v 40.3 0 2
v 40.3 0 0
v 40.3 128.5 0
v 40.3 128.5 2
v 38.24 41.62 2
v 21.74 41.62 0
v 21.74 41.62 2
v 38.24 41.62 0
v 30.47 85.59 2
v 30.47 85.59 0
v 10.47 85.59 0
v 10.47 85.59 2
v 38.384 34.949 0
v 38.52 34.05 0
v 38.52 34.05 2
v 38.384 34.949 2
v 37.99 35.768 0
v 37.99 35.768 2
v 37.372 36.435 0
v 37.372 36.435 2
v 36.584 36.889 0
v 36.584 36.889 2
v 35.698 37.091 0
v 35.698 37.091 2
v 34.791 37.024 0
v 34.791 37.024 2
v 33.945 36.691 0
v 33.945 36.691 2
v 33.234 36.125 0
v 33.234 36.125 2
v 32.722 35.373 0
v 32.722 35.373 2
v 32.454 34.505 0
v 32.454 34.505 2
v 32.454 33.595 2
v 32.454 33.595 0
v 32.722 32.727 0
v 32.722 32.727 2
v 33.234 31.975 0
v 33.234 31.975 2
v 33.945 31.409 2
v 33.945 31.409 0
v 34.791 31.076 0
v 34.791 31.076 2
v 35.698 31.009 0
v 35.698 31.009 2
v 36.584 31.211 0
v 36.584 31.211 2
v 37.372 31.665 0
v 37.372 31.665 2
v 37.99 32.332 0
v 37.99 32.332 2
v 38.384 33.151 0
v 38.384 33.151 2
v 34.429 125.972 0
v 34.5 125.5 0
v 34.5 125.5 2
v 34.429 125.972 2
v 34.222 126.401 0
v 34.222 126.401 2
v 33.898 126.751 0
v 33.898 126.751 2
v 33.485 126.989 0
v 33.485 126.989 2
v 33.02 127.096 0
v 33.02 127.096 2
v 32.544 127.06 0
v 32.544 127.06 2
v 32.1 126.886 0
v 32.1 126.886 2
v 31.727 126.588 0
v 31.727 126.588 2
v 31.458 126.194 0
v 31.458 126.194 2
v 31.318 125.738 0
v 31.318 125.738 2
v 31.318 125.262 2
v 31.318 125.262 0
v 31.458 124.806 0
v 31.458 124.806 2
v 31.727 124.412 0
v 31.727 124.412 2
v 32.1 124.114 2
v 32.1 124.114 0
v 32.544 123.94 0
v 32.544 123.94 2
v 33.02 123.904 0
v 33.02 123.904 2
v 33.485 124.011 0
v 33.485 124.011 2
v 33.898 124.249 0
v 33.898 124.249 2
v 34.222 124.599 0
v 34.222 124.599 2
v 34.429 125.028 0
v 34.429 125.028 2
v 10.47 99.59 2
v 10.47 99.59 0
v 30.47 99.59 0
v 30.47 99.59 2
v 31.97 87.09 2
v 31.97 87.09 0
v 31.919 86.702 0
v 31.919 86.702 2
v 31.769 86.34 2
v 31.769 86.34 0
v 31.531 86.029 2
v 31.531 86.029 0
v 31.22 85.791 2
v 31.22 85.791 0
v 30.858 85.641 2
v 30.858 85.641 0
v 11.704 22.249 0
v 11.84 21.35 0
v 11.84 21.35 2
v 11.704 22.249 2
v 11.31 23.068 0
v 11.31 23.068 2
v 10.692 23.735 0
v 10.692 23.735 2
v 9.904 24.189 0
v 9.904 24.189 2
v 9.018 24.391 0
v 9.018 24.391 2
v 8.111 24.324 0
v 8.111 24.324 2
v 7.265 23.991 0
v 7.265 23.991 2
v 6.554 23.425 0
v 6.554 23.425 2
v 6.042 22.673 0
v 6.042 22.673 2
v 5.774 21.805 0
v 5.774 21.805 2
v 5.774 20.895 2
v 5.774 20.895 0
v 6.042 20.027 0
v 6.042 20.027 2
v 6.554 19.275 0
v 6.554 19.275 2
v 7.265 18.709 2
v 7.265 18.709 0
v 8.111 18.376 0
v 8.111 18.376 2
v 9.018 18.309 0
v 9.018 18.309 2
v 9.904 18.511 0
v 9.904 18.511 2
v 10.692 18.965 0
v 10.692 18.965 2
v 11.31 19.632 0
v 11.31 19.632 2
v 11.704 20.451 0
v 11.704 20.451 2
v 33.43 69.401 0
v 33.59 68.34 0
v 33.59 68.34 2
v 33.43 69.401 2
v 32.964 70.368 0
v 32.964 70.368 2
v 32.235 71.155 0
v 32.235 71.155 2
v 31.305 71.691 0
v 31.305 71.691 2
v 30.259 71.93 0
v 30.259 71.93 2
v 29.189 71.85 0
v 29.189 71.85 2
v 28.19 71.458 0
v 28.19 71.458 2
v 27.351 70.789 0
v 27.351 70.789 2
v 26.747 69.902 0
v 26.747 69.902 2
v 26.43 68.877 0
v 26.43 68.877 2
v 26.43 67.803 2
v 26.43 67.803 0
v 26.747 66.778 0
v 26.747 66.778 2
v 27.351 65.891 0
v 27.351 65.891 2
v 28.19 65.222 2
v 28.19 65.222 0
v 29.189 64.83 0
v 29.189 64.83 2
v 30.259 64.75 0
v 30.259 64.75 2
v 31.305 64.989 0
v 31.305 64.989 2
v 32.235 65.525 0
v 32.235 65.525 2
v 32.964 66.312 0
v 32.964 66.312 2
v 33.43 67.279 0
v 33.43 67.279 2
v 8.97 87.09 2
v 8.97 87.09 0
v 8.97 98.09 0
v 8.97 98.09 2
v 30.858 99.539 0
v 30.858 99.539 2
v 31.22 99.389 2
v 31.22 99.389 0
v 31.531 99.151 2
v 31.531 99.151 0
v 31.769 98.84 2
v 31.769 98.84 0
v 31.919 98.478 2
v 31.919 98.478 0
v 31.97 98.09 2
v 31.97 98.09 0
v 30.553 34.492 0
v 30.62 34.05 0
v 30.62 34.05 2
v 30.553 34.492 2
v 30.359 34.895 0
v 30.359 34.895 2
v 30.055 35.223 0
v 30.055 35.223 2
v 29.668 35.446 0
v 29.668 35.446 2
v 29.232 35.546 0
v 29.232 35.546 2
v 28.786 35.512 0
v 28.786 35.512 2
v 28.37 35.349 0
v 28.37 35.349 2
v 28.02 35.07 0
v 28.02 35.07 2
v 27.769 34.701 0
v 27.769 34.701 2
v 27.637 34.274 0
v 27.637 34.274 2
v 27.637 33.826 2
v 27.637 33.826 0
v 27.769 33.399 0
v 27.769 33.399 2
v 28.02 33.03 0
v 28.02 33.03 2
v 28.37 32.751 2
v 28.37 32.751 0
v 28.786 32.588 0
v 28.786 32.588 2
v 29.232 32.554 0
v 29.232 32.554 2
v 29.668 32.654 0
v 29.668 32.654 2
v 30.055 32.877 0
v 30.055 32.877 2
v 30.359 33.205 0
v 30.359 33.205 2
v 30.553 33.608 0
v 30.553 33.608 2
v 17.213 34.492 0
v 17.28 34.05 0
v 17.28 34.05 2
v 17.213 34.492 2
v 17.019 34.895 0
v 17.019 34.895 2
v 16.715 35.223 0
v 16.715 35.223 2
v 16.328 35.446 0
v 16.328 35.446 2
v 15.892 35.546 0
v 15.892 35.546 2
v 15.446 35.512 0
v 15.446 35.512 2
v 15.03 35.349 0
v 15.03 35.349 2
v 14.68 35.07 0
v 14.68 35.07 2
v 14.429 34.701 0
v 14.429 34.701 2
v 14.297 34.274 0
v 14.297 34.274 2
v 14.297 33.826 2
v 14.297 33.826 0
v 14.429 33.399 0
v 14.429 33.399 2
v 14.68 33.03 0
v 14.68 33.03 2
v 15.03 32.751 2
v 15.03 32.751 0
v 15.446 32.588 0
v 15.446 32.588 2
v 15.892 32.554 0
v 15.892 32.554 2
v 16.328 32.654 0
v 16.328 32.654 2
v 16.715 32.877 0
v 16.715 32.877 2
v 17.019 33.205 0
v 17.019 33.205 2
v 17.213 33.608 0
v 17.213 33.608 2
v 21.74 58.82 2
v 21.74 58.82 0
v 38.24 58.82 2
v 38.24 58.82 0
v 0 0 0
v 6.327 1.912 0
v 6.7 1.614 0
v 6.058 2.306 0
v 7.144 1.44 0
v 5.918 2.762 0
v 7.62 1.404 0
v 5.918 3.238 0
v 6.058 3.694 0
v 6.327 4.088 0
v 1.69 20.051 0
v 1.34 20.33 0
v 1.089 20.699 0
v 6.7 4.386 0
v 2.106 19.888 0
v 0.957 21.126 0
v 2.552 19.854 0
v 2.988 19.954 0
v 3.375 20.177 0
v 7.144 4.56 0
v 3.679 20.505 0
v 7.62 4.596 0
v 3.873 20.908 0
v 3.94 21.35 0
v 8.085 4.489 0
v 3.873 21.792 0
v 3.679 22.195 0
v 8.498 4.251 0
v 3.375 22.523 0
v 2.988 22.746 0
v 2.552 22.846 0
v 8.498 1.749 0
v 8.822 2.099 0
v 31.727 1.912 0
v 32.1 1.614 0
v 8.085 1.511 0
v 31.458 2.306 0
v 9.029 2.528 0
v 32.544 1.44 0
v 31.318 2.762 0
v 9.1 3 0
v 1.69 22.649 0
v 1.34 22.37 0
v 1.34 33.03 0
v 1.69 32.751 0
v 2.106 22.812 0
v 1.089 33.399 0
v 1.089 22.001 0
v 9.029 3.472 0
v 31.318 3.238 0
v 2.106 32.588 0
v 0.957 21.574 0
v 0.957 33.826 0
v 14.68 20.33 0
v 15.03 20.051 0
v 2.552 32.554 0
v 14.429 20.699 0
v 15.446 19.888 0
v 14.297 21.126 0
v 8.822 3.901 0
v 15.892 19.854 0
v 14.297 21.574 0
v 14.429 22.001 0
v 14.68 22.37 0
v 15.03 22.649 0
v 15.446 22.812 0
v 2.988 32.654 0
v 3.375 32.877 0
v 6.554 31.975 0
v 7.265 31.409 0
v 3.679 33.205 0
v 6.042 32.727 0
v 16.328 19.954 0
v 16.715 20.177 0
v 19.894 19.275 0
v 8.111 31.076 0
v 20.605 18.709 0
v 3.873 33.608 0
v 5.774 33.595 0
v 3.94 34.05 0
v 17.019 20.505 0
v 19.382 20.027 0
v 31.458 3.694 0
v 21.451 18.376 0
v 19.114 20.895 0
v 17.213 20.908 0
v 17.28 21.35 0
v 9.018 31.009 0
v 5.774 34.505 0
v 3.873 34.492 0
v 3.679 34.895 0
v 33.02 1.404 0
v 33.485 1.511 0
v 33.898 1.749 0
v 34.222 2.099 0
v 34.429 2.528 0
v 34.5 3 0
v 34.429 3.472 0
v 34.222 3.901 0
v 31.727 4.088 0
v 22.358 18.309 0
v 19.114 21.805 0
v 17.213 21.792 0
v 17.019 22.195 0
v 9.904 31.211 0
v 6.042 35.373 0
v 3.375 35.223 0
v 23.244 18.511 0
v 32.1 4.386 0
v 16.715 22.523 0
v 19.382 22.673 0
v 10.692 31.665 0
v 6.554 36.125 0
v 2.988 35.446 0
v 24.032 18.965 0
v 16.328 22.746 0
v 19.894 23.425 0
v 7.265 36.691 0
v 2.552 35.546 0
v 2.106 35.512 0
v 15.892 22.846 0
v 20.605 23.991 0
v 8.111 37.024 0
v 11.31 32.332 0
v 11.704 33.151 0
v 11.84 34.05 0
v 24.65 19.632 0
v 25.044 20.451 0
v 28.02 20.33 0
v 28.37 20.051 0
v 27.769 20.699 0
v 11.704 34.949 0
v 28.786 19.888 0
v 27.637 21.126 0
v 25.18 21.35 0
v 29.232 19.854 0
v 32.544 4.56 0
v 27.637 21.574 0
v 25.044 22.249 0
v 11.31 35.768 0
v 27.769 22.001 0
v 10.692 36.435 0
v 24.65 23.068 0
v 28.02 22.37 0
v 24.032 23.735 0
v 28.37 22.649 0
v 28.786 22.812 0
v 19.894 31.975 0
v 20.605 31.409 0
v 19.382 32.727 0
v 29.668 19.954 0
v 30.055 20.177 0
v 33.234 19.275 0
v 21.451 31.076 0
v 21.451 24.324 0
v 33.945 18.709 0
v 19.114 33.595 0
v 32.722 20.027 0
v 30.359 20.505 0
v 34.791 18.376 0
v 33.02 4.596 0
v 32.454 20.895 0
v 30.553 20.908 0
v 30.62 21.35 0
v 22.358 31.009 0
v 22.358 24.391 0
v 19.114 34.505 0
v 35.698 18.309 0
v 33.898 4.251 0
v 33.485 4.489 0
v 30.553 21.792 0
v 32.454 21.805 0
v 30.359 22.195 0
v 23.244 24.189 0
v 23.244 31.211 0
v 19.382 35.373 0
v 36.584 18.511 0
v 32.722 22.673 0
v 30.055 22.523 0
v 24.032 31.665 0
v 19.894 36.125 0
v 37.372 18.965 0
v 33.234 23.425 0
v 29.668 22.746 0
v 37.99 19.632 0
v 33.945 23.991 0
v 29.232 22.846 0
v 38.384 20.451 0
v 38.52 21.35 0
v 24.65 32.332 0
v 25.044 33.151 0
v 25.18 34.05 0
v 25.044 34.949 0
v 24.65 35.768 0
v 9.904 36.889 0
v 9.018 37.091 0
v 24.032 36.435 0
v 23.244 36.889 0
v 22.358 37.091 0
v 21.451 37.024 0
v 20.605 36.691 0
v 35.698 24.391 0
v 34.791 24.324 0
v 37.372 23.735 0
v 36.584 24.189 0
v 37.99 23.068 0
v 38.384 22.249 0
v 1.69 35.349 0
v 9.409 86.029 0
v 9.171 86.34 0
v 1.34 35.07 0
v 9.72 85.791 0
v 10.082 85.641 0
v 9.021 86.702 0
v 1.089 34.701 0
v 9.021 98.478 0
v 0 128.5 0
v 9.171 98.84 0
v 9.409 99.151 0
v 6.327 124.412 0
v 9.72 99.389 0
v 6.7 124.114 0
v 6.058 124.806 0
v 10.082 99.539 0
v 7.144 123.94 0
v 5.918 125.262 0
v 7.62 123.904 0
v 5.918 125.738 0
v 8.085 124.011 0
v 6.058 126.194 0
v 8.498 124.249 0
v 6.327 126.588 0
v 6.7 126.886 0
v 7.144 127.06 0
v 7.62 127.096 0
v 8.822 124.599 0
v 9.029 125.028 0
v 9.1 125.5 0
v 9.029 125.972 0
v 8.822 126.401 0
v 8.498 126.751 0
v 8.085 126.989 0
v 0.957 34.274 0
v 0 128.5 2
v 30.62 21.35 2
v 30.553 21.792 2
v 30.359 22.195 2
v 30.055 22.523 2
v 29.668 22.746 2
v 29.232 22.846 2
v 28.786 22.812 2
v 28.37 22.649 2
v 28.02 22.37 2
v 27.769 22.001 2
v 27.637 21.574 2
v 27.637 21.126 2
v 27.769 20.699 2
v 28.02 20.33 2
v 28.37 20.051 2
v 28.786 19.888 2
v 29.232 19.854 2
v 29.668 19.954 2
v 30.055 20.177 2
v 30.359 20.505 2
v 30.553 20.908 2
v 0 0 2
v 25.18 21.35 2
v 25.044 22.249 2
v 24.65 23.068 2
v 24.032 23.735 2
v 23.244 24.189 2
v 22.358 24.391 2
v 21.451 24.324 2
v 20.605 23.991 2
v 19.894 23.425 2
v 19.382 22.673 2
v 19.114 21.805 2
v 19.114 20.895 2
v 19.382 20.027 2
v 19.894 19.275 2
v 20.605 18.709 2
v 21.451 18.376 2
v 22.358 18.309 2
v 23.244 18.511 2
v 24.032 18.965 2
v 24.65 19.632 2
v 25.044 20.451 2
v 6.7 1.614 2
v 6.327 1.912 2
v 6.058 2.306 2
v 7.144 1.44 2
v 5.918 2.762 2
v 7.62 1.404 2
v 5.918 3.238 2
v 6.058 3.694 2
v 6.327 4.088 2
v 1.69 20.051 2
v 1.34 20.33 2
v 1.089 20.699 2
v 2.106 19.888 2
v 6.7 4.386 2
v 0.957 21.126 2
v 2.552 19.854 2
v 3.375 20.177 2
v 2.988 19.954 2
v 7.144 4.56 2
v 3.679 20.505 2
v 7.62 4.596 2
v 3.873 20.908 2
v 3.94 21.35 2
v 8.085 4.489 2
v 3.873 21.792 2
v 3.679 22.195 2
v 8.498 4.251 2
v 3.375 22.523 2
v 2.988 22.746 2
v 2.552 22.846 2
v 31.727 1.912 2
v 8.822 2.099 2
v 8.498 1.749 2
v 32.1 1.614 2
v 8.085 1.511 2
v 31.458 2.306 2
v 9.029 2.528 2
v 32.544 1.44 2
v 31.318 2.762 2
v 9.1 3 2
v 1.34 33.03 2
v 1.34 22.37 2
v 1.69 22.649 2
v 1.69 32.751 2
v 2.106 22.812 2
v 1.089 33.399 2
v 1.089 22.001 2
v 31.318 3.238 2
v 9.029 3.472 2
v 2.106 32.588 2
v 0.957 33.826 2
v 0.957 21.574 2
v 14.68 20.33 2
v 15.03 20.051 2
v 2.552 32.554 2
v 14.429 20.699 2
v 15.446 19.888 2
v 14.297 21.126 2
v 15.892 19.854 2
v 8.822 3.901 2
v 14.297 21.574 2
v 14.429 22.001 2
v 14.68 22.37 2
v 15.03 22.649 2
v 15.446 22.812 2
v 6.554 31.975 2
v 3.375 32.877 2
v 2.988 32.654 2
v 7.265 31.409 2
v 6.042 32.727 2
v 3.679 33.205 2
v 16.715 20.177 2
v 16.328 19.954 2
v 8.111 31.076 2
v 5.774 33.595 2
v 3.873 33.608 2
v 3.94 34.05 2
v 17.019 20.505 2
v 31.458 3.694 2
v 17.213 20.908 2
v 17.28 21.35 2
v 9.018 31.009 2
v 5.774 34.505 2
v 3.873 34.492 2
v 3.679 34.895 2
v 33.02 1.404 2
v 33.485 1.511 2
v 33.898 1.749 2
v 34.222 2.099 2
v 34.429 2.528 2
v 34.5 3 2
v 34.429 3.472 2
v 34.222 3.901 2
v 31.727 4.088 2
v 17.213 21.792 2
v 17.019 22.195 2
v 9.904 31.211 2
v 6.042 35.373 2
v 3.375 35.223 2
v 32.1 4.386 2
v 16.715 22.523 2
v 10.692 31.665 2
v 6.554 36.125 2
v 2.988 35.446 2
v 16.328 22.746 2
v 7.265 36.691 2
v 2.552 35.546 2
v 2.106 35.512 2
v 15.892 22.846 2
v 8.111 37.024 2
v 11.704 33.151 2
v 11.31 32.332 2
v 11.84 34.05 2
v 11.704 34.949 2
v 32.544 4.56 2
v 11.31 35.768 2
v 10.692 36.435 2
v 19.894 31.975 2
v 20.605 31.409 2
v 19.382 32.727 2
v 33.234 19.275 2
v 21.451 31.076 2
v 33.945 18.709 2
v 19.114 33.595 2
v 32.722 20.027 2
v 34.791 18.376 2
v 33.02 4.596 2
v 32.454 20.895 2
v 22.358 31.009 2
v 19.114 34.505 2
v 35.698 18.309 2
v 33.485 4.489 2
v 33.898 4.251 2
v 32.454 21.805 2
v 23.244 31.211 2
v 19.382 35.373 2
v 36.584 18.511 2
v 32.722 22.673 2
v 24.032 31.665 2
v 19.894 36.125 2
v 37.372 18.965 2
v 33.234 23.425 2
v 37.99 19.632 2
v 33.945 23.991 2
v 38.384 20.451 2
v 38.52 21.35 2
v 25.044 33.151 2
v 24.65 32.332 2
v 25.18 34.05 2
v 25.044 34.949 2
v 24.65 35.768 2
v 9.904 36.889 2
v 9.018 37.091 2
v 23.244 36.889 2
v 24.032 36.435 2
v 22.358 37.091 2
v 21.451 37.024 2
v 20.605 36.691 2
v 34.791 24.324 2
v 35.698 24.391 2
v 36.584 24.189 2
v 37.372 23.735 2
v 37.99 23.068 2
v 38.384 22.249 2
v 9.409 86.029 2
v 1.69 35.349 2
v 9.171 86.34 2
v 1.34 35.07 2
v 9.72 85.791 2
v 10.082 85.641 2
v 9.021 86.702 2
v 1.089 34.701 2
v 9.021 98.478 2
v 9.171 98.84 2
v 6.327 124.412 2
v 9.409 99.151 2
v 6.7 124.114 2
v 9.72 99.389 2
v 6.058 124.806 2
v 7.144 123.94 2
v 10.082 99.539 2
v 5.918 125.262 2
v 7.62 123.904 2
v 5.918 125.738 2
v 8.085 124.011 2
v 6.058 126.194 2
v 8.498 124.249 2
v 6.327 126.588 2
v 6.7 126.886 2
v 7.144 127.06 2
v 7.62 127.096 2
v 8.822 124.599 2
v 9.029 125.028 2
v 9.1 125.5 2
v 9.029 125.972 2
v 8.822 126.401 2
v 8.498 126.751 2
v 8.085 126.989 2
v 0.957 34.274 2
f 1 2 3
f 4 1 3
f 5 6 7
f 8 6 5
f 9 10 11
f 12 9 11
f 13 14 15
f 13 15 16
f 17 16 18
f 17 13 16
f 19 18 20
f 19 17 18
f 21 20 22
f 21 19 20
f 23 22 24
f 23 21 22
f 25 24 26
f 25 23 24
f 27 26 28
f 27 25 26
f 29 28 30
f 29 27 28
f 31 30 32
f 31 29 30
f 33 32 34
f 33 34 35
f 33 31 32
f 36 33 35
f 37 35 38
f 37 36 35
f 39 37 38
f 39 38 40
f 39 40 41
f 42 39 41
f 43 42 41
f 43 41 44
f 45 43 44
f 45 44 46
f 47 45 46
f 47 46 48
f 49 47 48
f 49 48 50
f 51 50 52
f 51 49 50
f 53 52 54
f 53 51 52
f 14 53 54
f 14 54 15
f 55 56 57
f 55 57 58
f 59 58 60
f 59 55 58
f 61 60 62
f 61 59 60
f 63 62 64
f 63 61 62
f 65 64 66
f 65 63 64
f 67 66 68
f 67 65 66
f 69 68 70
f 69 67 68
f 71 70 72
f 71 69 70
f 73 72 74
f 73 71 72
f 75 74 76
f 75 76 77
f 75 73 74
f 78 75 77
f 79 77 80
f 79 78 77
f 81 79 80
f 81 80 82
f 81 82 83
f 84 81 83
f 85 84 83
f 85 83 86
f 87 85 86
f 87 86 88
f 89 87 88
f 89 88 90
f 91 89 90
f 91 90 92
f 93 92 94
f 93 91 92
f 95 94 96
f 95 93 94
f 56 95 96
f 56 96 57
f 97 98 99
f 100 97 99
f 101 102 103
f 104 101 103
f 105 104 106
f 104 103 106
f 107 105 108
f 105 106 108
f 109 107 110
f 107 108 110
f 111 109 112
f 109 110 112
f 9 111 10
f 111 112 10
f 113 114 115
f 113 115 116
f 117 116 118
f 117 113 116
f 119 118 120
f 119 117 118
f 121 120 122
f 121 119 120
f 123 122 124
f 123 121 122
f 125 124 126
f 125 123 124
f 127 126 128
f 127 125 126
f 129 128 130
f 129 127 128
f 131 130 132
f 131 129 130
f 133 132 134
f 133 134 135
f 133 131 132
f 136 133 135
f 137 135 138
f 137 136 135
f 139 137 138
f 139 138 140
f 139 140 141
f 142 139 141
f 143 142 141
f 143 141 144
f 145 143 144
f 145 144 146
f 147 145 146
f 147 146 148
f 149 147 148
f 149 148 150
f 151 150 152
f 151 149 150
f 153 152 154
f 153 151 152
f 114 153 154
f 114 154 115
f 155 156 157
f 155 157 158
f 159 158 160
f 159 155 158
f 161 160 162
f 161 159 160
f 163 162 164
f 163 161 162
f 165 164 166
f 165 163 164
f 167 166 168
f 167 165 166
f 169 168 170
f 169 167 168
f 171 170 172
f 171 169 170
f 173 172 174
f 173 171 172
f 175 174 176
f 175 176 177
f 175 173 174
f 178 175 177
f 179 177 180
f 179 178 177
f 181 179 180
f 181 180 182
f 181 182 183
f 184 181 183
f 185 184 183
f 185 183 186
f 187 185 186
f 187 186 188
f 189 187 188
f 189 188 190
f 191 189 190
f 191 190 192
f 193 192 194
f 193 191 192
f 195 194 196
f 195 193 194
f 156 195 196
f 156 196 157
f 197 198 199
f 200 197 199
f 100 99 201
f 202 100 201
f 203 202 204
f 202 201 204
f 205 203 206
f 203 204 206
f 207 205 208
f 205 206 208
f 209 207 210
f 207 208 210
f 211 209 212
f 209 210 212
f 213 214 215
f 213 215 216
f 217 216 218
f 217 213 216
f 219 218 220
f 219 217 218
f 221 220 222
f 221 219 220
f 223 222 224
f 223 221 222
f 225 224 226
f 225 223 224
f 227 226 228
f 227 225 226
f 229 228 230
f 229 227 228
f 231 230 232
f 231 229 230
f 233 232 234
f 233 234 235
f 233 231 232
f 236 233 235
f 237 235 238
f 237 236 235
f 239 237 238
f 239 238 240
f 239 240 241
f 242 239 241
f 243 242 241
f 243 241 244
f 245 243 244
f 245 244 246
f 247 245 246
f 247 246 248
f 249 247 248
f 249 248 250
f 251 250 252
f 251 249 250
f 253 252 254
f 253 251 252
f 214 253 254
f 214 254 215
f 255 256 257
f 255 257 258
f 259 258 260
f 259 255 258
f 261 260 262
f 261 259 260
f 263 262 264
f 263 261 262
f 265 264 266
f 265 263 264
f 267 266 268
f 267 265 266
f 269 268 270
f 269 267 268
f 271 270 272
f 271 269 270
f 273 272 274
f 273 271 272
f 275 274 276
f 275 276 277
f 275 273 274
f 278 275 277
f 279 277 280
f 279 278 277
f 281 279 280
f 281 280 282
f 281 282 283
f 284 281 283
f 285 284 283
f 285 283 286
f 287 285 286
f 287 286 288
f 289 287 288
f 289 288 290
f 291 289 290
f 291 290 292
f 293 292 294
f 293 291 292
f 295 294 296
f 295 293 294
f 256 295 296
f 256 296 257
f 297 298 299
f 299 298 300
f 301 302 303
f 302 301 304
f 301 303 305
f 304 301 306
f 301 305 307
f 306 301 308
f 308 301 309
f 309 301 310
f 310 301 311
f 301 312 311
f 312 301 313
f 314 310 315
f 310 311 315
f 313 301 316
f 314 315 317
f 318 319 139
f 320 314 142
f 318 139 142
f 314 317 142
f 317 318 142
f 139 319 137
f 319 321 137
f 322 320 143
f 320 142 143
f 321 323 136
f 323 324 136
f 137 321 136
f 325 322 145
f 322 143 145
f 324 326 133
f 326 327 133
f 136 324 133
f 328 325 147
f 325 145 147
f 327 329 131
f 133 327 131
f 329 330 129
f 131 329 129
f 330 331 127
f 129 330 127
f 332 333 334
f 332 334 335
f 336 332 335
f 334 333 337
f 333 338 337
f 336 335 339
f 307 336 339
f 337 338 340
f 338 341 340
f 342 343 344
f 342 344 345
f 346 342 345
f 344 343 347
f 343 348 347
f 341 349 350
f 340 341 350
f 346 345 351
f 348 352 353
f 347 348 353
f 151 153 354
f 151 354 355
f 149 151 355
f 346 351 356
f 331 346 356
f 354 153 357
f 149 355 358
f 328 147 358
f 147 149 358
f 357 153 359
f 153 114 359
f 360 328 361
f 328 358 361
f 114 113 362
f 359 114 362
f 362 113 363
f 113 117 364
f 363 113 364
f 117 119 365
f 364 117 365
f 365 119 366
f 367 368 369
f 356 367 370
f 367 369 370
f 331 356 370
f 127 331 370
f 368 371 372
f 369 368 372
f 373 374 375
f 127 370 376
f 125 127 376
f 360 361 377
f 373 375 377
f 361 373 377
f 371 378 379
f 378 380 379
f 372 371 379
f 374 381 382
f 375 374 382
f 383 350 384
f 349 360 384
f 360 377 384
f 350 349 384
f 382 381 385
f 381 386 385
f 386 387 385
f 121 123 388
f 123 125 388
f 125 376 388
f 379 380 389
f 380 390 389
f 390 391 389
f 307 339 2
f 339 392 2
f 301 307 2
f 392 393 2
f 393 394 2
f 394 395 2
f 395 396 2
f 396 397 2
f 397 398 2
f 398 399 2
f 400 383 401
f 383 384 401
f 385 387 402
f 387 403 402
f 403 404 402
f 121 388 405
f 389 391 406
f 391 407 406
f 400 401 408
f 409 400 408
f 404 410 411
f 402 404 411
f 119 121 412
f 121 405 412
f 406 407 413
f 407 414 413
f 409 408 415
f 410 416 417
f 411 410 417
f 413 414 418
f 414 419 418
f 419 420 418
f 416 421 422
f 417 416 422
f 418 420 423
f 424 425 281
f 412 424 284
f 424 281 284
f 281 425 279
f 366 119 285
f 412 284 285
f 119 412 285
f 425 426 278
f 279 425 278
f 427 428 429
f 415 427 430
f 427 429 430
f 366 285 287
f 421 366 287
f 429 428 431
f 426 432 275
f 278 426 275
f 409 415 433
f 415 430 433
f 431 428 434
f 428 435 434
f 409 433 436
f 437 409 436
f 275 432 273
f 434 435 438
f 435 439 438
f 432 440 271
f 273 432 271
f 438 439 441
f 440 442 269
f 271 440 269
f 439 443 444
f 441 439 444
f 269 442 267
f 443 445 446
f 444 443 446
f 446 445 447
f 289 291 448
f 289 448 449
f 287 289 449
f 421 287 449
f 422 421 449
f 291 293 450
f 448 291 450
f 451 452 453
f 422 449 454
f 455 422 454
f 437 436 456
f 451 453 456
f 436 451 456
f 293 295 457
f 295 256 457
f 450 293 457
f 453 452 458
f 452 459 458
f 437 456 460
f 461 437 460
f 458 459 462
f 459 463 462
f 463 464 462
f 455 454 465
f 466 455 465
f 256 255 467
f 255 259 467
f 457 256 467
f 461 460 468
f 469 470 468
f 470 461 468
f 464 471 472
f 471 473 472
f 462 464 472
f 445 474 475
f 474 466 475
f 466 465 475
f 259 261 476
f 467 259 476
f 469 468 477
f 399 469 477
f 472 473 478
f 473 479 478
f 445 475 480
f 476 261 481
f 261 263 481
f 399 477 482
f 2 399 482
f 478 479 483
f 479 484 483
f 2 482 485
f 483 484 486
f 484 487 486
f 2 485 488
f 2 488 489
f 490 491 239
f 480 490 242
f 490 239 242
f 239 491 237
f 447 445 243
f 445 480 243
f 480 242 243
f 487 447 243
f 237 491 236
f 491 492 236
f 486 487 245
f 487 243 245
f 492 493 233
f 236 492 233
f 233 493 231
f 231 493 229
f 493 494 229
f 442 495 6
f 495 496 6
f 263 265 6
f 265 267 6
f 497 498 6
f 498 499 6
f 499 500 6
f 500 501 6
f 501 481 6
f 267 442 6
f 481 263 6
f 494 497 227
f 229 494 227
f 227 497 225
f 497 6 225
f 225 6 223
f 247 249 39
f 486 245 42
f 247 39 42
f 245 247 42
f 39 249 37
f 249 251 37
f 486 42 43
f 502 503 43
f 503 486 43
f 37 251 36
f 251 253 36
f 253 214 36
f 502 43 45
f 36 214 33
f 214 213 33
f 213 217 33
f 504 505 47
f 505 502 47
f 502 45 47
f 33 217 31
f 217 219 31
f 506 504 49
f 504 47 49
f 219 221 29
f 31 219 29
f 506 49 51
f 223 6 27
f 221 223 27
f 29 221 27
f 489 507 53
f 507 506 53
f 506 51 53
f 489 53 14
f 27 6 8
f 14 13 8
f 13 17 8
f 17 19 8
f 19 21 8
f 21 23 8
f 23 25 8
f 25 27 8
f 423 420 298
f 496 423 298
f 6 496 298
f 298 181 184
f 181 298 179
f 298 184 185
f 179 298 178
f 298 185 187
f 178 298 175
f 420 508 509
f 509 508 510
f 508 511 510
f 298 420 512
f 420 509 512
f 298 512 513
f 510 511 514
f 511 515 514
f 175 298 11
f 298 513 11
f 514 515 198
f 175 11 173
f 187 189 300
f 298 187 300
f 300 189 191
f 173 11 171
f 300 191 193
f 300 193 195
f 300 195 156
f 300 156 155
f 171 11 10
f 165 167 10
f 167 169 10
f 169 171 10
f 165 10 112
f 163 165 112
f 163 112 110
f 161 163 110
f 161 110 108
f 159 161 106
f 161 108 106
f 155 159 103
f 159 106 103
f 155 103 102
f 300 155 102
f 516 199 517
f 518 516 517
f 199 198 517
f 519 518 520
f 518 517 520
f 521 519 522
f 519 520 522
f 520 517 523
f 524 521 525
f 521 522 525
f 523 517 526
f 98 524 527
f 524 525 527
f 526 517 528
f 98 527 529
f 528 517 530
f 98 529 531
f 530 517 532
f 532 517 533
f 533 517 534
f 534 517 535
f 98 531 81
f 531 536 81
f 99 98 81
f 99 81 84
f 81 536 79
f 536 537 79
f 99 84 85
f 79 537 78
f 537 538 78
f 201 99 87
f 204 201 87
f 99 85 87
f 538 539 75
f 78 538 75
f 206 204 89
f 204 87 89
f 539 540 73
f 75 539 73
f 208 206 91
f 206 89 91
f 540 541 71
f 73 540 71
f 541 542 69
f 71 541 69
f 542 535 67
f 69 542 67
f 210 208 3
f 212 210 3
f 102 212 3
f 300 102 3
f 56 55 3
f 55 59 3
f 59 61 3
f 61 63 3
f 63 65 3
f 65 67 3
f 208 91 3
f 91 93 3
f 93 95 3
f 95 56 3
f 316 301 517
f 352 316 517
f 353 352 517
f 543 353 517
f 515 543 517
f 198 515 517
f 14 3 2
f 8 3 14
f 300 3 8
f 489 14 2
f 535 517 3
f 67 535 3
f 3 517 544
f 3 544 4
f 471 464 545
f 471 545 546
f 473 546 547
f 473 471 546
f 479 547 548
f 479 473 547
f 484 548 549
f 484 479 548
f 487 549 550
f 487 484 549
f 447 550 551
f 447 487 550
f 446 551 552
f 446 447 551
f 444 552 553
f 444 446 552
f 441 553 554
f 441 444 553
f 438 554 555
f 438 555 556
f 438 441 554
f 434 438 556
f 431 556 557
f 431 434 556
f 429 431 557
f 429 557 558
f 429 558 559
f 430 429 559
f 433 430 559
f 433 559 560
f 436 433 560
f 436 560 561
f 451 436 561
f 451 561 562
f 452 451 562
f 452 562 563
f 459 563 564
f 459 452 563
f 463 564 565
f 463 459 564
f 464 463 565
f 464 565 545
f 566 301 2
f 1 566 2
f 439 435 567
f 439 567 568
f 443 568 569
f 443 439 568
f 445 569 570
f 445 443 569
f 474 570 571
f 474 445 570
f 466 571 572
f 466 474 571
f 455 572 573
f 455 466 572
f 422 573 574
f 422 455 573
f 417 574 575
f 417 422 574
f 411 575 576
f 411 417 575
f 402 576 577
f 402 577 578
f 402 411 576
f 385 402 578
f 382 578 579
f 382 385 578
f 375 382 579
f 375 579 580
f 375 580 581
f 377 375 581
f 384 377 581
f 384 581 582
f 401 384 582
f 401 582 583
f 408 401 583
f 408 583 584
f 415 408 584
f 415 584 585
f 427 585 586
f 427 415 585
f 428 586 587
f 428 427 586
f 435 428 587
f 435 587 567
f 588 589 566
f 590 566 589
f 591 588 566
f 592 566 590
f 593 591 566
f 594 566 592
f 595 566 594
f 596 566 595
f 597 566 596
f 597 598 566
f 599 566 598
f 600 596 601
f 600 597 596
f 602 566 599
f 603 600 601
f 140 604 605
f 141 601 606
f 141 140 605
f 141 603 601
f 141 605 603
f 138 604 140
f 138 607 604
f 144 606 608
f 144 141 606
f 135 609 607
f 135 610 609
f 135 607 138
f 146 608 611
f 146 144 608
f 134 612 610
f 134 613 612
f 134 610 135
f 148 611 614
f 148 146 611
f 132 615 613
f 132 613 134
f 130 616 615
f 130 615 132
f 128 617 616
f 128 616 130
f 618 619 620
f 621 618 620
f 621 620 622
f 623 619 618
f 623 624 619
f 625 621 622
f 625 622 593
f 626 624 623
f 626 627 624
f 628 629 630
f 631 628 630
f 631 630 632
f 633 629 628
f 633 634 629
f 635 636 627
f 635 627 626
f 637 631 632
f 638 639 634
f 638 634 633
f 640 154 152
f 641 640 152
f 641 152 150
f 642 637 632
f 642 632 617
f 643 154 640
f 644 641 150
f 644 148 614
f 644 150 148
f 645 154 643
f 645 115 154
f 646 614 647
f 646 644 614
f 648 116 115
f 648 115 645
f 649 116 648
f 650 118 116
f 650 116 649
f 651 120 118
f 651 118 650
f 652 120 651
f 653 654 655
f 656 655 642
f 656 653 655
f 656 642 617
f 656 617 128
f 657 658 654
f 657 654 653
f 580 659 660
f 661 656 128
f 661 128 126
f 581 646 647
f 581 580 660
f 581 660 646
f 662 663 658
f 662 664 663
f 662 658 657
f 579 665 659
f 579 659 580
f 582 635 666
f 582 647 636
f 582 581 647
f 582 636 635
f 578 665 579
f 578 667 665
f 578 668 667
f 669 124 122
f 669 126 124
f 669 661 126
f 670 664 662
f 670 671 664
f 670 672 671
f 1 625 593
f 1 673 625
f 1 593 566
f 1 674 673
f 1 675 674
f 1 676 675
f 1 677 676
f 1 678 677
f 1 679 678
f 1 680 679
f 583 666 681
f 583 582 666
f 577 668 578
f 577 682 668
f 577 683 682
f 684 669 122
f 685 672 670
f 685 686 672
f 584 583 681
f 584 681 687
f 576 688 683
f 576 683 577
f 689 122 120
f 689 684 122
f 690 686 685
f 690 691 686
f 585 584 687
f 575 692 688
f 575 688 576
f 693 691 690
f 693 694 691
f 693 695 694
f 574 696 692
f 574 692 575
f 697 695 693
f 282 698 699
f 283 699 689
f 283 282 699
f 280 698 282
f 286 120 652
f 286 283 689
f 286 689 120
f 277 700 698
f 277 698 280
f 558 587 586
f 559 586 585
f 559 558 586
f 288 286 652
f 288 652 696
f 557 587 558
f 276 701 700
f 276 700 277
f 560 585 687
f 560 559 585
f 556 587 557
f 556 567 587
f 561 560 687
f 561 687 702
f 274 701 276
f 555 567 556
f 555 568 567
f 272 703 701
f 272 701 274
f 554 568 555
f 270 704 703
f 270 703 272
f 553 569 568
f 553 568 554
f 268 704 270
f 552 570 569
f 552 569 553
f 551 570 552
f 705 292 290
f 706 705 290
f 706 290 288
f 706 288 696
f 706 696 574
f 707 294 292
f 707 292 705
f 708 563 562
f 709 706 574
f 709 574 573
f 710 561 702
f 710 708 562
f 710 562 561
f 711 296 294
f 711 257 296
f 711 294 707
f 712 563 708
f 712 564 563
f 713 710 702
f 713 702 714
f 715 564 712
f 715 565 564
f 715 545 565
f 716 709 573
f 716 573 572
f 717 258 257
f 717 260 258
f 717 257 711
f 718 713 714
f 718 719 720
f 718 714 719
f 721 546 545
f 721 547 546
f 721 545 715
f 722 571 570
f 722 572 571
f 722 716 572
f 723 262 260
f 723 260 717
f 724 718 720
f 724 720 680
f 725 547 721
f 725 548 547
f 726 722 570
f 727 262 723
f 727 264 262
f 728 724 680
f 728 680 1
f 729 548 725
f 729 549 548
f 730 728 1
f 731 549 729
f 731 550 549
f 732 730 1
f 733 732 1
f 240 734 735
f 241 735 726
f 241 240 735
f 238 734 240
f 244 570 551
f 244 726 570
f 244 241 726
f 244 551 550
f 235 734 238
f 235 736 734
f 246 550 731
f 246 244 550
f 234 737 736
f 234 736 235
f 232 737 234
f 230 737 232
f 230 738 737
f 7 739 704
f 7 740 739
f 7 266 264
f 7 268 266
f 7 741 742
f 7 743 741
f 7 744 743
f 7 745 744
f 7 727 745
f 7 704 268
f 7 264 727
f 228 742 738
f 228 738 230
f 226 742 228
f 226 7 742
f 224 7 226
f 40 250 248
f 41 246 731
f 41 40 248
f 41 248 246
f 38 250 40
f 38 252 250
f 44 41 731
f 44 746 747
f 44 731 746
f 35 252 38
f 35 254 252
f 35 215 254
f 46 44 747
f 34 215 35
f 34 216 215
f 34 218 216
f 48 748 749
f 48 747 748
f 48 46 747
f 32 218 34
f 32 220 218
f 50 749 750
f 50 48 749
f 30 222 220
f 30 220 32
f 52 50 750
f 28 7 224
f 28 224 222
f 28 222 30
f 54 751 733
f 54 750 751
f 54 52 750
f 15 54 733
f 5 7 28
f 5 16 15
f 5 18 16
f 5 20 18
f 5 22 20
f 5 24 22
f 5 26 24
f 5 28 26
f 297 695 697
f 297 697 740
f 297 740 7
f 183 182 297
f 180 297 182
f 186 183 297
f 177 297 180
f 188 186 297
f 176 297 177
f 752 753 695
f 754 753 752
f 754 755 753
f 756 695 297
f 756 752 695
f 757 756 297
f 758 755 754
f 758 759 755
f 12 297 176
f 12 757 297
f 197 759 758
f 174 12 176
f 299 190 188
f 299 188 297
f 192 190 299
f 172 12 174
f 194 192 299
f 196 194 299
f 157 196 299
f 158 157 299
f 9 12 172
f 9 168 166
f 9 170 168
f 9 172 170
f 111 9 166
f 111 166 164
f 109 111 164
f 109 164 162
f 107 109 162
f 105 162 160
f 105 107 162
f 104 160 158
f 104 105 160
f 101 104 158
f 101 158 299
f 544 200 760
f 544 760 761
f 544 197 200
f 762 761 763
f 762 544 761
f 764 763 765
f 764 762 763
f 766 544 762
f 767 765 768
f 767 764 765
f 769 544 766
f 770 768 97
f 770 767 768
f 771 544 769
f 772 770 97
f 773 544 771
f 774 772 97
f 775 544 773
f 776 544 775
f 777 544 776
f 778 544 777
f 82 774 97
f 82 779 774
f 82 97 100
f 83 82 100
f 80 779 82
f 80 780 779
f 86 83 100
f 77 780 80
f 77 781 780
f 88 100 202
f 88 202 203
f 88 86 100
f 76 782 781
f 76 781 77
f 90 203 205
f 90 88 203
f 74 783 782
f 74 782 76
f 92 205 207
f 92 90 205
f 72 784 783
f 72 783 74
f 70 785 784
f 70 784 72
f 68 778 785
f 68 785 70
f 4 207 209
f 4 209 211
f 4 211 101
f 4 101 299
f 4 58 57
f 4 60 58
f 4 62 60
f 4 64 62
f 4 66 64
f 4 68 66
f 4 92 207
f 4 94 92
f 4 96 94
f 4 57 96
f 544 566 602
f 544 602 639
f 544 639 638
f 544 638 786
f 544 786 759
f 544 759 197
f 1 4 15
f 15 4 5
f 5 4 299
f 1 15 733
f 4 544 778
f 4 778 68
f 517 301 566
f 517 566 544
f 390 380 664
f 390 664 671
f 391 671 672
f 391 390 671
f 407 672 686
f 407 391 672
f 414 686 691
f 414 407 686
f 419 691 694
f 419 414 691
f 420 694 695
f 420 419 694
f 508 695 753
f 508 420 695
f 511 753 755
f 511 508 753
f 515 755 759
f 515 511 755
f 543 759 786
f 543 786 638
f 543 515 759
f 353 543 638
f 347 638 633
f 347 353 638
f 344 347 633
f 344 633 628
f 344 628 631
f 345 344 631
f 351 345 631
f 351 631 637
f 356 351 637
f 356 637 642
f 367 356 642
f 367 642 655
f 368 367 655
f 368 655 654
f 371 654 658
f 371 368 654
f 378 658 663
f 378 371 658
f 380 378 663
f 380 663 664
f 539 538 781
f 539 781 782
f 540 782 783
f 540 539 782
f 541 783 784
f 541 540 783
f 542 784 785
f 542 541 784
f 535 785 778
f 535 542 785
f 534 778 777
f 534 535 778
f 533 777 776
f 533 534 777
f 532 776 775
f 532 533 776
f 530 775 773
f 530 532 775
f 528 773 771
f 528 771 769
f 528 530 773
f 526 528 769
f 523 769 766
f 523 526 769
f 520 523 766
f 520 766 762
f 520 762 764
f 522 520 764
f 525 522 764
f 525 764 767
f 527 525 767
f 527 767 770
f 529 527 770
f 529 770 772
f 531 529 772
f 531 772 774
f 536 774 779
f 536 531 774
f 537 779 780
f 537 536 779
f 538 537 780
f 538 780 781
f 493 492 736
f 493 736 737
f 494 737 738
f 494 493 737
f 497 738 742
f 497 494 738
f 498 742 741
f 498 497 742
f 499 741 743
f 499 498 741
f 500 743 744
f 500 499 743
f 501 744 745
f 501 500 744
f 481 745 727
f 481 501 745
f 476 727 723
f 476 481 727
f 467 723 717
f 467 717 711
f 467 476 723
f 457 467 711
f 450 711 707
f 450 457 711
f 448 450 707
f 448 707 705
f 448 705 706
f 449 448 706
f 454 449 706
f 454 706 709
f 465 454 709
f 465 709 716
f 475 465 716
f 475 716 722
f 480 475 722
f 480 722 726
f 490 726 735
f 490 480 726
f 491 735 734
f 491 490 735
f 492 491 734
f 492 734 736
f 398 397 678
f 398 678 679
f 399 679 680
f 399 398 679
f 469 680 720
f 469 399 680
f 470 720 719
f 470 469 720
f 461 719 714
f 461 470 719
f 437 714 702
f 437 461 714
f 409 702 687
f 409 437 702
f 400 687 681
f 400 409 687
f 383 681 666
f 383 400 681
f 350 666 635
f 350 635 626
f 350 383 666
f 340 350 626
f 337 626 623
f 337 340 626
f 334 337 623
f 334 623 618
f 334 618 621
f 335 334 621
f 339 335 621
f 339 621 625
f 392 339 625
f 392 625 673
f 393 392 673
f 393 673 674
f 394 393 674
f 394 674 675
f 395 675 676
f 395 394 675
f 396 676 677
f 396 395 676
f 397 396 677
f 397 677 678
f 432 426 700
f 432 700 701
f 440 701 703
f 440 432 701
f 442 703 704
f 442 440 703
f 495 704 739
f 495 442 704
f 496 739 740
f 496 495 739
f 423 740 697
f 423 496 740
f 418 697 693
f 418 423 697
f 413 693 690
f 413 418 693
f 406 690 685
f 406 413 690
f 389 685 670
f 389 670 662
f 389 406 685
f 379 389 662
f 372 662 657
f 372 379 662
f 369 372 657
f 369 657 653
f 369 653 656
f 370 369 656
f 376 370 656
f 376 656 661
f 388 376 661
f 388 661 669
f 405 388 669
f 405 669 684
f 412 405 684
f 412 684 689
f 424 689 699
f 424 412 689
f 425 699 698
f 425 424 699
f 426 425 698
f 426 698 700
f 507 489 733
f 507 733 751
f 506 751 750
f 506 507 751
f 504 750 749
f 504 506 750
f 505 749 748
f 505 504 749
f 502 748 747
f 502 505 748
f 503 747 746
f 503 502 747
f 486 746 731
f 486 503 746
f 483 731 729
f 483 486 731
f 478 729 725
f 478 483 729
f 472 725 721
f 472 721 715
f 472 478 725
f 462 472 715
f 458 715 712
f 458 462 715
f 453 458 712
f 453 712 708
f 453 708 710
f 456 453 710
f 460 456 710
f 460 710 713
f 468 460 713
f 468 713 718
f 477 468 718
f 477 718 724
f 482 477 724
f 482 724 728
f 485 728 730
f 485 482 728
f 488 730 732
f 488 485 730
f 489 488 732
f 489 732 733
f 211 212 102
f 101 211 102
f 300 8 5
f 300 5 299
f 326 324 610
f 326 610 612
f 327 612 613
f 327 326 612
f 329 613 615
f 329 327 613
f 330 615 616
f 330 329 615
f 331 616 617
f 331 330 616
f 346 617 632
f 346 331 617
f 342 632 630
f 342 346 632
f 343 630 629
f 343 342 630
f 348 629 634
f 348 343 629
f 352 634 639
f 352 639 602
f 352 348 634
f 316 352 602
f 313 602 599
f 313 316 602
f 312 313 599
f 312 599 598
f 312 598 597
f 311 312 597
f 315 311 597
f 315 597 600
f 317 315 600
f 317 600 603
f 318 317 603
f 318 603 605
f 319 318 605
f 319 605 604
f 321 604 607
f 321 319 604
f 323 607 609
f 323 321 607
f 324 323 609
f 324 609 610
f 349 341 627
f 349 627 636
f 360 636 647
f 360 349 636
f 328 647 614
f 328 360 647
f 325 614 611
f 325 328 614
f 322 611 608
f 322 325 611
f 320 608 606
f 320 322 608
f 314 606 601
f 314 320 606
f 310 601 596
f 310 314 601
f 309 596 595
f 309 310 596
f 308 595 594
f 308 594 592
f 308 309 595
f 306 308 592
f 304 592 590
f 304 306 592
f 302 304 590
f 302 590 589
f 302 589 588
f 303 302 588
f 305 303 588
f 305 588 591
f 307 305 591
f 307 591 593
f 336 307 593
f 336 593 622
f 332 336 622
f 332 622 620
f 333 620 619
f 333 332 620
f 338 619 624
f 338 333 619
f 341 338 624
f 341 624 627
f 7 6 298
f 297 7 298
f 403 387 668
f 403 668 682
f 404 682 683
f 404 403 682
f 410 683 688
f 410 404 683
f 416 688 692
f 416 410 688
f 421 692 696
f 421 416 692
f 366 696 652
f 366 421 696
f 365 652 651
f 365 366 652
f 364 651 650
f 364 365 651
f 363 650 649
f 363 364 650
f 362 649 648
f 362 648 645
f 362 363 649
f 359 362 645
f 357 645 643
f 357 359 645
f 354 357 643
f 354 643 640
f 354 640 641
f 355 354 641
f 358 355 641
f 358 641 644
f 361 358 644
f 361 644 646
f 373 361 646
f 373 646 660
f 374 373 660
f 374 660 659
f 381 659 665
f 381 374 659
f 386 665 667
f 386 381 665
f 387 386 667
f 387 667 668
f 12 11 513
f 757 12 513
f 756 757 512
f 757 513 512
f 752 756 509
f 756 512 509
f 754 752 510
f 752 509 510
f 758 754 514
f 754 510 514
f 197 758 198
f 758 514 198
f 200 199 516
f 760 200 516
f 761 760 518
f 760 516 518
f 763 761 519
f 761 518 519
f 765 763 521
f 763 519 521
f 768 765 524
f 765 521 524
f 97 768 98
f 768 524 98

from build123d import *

# Parameters (mm, degrees)
SKETCH2_W           = 40.3
SKETCH2_H           = 128.5
SKETCH2_R           = 1.6
SKETCH2_R_2         = 3.05
SKETCH2_R_3         = 1.5
SKETCH2_R_4         = 3.6
SKETCH2_W_2         = 16.5
SKETCH2_H_2         = 17.2
BOSS_EXTRUDE2_DEPTH = 2


with BuildPart() as part:
    # Sketch2 → Boss-Extrude2 (new body)
    with BuildSketch(Plane.XY):
        with Locations((20.15, 64.25)):
            Rectangle(SKETCH2_W, SKETCH2_H)
        with Locations((7.5, 125.5)):
            Circle(SKETCH2_R, mode=Mode.SUBTRACT)
        with Locations((32.9, 125.5)):
            Circle(SKETCH2_R, mode=Mode.SUBTRACT)
        with Locations((7.5, 3)):
            Circle(SKETCH2_R, mode=Mode.SUBTRACT)
        with Locations((32.9, 3)):
            Circle(SKETCH2_R, mode=Mode.SUBTRACT)
        with Locations((8.79, 34.05)):
            Circle(SKETCH2_R_2, mode=Mode.SUBTRACT)
        with Locations((8.79, 21.35)):
            Circle(SKETCH2_R_2, mode=Mode.SUBTRACT)
        with Locations((22.13, 34.05)):
            Circle(SKETCH2_R_2, mode=Mode.SUBTRACT)
        with Locations((22.13, 21.35)):
            Circle(SKETCH2_R_2, mode=Mode.SUBTRACT)
        with Locations((35.47, 21.35)):
            Circle(SKETCH2_R_2, mode=Mode.SUBTRACT)
        with Locations((35.47, 34.05)):
            Circle(SKETCH2_R_2, mode=Mode.SUBTRACT)
        with Locations((2.44, 34.05)):
            Circle(SKETCH2_R_3, mode=Mode.SUBTRACT)
        with Locations((15.78, 34.05)):
            Circle(SKETCH2_R_3, mode=Mode.SUBTRACT)
        with Locations((29.12, 34.05)):
            Circle(SKETCH2_R_3, mode=Mode.SUBTRACT)
        with Locations((2.44, 21.35)):
            Circle(SKETCH2_R_3, mode=Mode.SUBTRACT)
        with Locations((15.78, 21.35)):
            Circle(SKETCH2_R_3, mode=Mode.SUBTRACT)
        with Locations((29.12, 21.35)):
            Circle(SKETCH2_R_3, mode=Mode.SUBTRACT)
        with Locations((29.99, 68.34)):
            Circle(SKETCH2_R_4, mode=Mode.SUBTRACT)
        with Locations((29.99, 50.22)):
            Rectangle(SKETCH2_W_2, SKETCH2_H_2, mode=Mode.SUBTRACT)
        with BuildLine():
            Line((10.47, 99.59), (30.47, 99.59))
            ThreePointArc((30.47, 99.59), (31.530660172, 99.150660172), (31.97, 98.09))
            Line((31.97, 98.09), (31.97, 87.09))
            ThreePointArc((31.97, 87.09), (31.530660172, 86.029339828), (30.47, 85.59))
            Line((30.47, 85.59), (10.47, 85.59))
            ThreePointArc((10.47, 85.59), (9.409339828, 86.029339828), (8.97, 87.09))
            Line((8.97, 87.09), (8.97, 98.09))
            ThreePointArc((8.97, 98.09), (9.409339828, 99.150660172), (10.47, 99.59))
        make_face(mode=Mode.SUBTRACT)
    extrude(amount=BOSS_EXTRUDE2_DEPTH)


solid = part.part
